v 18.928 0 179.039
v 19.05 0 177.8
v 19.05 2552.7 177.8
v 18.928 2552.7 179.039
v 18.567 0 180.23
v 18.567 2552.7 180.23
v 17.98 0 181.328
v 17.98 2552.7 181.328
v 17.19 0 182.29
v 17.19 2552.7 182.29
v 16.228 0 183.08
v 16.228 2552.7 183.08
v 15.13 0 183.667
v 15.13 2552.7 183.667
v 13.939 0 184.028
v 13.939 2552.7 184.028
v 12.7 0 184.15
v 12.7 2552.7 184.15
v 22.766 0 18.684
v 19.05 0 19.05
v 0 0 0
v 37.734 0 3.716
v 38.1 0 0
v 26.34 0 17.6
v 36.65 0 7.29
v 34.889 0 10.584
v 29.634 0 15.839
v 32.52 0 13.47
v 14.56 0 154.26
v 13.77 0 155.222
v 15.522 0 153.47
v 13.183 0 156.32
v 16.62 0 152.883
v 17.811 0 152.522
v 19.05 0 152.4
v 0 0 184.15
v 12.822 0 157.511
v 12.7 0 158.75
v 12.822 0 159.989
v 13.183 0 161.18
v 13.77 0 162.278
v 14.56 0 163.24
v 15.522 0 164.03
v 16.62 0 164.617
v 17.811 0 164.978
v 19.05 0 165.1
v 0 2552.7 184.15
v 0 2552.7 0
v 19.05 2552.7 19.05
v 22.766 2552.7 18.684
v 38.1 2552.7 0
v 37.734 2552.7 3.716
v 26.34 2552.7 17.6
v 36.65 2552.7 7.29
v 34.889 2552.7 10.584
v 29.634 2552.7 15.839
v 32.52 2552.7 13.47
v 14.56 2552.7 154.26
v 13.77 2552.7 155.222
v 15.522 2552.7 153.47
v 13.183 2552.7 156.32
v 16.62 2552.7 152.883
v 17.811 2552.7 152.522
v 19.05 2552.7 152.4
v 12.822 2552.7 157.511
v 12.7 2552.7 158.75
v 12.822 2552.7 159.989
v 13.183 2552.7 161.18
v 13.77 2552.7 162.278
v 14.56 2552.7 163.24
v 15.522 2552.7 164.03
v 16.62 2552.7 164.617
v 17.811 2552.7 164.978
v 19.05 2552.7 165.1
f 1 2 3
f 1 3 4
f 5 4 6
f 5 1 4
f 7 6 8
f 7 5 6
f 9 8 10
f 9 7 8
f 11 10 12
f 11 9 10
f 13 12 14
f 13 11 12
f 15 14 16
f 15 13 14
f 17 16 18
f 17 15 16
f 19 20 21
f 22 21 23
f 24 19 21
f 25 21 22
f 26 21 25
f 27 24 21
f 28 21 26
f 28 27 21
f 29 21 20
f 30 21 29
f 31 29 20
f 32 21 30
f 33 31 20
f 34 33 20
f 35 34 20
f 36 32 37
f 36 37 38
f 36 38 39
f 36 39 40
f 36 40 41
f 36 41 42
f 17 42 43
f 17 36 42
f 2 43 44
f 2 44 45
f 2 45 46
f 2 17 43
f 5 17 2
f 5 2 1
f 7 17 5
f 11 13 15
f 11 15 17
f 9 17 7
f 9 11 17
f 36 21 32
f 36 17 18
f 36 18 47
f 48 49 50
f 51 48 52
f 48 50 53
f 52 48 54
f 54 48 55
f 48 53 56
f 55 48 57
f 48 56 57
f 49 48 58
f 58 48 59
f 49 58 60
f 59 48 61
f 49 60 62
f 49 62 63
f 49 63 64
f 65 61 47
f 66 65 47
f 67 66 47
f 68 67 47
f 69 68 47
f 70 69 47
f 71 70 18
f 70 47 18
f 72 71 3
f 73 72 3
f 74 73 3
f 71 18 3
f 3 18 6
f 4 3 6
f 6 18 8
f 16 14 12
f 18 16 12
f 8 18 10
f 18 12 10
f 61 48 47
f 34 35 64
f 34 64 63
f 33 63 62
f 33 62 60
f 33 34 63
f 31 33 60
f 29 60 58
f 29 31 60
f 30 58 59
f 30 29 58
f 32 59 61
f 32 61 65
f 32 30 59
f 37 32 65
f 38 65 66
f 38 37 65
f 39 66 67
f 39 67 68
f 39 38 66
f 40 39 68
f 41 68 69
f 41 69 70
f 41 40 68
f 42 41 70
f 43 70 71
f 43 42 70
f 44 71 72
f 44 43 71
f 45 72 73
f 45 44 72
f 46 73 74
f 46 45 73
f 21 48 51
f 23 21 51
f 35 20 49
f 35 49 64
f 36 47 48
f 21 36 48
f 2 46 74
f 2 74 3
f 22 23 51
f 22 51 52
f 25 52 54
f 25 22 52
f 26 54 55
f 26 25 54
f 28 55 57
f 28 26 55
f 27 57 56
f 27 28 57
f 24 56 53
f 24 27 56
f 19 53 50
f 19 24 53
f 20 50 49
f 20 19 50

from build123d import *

# Parameters (mm, degrees)
F1_DEPTH = 2552.7


with BuildPart() as f1:
    # F0 (on Front) → F1 (new body)
    with BuildSketch(Plane.XZ):
        with BuildLine():
            Line((0, 184.15), (0, 0))
            Line((0, 0), (19.05, 0))
            Line((19.05, 0), (19.05, 19.05))
            Line((19.05, 19.05), (19.05, 152.4))
            ThreePointArc((19.05, 152.4), (12.7, 158.75), (19.05, 165.1))
            Line((19.05, 165.1), (19.05, 177.8))
            ThreePointArc((19.05, 177.8), (17.190128, 182.290128), (12.7, 184.15))
            Line((12.7, 184.15), (0, 184.15))
        make_face()
        with BuildLine():
            Line((19.05, 19.05), (19.05, 0))
            Line((19.05, 0), (38.1, 0))
            ThreePointArc((38.1, 0), (32.520384, 13.470384), (19.05, 19.05))
        make_face()
    extrude(amount=-F1_DEPTH)


solid = f1.part
